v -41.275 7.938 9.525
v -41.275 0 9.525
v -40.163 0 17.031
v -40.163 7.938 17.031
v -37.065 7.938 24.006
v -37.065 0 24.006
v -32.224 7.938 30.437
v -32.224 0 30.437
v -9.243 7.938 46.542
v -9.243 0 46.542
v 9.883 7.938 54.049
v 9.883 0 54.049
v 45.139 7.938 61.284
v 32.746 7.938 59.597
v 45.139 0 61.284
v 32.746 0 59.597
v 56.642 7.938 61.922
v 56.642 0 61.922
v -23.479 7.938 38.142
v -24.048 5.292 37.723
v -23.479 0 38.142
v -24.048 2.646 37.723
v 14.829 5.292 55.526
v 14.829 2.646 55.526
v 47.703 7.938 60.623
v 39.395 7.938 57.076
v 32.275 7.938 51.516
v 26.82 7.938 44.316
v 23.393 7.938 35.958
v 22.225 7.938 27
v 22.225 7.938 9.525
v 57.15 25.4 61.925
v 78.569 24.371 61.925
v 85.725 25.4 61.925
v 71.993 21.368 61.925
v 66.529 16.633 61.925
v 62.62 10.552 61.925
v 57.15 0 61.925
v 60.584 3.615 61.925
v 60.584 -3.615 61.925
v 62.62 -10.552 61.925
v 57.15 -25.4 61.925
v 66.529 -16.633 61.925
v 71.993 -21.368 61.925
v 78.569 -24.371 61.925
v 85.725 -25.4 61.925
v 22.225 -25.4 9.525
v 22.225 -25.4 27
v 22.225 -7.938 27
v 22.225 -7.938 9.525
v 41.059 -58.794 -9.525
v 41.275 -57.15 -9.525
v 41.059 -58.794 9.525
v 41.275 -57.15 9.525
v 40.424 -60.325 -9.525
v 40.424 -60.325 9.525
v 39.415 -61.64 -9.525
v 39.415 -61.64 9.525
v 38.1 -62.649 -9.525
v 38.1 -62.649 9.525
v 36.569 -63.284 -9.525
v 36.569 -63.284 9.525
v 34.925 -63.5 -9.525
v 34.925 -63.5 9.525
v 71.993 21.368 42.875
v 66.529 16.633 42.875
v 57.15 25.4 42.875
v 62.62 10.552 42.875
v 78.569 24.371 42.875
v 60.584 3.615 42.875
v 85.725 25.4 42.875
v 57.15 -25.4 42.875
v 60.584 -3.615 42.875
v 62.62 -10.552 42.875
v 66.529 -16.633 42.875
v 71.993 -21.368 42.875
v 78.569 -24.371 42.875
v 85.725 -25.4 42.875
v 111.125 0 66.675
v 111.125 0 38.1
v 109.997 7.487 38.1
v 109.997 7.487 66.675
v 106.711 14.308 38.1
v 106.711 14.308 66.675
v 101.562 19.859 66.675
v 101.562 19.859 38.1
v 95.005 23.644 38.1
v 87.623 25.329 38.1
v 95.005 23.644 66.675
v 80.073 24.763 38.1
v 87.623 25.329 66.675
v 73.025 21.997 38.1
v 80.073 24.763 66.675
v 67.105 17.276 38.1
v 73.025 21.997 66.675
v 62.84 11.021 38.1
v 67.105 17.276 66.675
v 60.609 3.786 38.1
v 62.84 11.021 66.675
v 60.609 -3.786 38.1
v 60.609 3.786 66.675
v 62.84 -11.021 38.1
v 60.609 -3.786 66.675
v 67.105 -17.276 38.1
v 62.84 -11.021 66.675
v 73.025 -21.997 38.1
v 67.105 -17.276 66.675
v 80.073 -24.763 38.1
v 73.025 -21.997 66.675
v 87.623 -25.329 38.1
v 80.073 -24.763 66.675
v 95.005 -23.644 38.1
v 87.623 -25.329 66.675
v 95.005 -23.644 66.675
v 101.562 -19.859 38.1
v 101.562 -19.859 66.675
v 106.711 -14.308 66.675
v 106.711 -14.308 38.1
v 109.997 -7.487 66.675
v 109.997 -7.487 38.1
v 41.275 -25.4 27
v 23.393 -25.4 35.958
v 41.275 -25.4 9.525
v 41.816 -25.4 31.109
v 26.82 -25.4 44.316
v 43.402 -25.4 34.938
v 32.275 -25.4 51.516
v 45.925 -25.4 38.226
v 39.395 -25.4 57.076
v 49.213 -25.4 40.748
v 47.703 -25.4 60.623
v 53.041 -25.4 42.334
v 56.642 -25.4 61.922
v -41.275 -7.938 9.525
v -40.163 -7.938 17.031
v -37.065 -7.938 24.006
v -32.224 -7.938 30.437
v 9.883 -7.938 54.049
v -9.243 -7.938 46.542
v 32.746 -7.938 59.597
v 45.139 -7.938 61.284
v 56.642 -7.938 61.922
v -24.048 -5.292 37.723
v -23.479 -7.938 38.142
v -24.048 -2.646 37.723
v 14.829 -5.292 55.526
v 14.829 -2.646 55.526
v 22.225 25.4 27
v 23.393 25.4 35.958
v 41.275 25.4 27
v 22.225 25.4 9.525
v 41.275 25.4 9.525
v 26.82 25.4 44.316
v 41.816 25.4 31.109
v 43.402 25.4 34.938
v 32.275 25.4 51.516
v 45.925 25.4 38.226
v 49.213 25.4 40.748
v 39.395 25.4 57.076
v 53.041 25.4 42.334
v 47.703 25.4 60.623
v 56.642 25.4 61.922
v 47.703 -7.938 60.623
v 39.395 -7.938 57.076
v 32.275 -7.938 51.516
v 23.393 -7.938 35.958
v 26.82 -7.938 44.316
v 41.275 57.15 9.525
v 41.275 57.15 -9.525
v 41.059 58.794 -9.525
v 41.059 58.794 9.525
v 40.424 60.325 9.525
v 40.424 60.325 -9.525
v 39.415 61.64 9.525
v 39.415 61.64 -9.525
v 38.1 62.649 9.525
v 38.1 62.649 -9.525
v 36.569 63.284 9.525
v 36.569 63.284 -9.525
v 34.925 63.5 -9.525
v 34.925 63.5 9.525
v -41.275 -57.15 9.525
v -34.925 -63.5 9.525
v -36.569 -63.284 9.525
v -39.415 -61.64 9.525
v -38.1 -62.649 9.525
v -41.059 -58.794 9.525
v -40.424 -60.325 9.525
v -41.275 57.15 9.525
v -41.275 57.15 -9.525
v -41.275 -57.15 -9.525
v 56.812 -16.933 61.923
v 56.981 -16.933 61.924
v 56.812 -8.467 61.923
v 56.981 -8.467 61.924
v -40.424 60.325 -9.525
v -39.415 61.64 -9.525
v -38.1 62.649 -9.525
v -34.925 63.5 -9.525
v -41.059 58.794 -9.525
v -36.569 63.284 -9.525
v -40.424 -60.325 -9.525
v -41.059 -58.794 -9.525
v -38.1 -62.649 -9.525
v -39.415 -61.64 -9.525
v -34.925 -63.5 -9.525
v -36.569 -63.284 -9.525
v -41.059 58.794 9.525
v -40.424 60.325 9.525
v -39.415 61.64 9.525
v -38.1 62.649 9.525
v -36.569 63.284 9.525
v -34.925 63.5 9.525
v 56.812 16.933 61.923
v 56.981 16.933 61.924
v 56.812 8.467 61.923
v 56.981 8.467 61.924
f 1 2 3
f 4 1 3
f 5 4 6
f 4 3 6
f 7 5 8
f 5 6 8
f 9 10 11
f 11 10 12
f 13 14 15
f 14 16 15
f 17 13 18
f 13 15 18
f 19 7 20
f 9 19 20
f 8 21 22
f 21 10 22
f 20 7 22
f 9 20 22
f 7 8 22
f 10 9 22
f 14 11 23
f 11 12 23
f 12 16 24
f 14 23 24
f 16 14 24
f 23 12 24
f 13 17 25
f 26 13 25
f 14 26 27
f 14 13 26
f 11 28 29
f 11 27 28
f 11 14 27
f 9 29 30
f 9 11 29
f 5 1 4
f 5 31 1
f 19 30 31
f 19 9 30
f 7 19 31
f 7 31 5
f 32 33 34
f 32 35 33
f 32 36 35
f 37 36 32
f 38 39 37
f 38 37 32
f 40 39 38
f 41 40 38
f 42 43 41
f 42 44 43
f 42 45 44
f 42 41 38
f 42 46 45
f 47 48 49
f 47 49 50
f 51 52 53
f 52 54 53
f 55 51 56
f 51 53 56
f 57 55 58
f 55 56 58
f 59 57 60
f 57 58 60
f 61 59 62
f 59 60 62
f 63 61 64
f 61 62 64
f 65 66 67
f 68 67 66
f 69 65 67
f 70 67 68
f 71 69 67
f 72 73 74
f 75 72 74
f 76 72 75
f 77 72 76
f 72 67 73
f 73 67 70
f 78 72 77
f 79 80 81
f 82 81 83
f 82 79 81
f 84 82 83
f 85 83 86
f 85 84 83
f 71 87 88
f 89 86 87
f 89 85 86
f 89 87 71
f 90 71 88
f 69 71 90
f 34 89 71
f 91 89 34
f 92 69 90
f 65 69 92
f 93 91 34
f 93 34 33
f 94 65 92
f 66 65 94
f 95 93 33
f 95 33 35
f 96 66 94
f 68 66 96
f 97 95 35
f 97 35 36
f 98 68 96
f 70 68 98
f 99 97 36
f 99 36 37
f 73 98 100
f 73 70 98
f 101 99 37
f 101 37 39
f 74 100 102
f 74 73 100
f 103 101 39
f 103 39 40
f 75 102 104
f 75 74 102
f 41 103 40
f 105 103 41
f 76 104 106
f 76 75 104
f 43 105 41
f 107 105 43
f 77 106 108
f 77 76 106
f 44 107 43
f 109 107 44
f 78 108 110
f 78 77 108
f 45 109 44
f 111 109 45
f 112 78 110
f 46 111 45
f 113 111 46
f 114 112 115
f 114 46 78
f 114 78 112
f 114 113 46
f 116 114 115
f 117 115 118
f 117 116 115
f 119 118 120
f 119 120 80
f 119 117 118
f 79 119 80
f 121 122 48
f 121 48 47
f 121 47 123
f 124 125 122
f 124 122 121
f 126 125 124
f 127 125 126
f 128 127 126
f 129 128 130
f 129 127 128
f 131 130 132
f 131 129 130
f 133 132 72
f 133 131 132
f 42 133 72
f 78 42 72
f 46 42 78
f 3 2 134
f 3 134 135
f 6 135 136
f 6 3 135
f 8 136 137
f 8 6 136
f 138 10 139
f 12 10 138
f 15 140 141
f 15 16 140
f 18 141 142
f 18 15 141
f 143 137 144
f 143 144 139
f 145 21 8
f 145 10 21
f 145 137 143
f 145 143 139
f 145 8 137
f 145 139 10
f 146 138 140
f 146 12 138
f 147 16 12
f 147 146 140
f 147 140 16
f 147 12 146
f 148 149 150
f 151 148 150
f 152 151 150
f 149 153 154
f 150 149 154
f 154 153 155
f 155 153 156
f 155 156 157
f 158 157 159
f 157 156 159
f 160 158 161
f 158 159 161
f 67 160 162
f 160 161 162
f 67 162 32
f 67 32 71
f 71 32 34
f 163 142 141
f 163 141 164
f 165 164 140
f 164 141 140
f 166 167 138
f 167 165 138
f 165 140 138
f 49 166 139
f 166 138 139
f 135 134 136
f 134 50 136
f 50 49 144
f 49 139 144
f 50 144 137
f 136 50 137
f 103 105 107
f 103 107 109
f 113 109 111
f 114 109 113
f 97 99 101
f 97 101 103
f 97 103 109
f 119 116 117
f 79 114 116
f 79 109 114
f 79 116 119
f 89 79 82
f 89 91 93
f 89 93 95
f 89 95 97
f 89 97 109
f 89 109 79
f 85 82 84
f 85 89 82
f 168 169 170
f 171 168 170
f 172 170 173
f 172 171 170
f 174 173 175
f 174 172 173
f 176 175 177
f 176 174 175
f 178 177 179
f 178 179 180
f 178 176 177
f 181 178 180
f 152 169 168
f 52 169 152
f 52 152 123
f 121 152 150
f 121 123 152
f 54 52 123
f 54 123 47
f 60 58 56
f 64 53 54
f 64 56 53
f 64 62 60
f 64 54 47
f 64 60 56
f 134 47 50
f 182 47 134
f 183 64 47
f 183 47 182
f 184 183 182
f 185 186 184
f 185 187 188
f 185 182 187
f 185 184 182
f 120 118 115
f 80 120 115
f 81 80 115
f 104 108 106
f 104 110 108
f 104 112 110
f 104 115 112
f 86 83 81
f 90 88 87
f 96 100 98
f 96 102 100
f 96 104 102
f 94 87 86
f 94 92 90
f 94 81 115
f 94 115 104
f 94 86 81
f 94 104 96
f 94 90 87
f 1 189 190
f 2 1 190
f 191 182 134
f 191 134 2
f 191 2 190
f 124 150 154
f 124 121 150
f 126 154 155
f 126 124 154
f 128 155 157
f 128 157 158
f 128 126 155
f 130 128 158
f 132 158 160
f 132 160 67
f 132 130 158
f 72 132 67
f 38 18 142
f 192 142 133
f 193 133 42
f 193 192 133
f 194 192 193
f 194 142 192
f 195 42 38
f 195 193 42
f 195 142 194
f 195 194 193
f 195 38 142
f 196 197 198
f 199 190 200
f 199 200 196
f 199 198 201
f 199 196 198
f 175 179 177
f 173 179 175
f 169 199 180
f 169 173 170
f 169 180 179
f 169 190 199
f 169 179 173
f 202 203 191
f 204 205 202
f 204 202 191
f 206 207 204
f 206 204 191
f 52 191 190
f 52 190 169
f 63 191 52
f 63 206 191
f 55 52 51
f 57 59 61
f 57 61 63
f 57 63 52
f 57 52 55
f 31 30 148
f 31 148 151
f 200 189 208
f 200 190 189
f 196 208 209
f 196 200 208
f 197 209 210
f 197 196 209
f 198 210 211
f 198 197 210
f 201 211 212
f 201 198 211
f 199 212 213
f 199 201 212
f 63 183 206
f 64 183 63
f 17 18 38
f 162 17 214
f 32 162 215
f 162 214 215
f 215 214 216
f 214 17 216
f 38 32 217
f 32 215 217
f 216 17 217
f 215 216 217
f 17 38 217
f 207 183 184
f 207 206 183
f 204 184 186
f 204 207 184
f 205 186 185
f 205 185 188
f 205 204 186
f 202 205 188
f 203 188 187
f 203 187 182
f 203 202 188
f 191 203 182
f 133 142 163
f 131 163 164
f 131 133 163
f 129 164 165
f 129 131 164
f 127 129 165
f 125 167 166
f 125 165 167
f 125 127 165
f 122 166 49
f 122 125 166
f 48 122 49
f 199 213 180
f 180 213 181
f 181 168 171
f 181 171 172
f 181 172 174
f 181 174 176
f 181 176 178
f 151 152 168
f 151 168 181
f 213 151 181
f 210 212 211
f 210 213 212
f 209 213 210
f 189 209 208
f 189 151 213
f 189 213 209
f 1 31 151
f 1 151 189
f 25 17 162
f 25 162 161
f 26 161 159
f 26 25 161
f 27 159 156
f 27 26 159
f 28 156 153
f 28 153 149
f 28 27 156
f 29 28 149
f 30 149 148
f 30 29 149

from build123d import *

# Parameters (mm, degrees)
F1_DEPTH = 63.5
F0_W     = 25.4
F0_H     = 19.05
F2_DEPTH = 25.4
F3_DEPTH = 7.9375
F5_R     = 6.35


with BuildPart() as f1:
    # F0 (on Front) → F1 (new body, symmetric)
    with BuildSketch(Plane.XZ):
        Polygon((22.225, 9.525), (-41.275, 9.525), (-41.275, -9.525), (41.275, -9.525), (41.275, 9.525), align=None)
    extrude(amount=F1_DEPTH, both=True)

    # F0 (on Front) → F2 (join, symmetric)
    with BuildSketch(Plane.XZ):
        with Locations((73.025, 52.4002)):
            Rectangle(F0_W, F0_H)
        with BuildLine():
            Line((22.225, 27.0002), (22.225, 9.525))
            Line((22.225, 9.525), (41.275, 9.525))
            Line((41.275, 9.525), (41.275, 27.0002))
            ThreePointArc((41.275, 27.0002), (45.9246798487, 38.2255201513), (57.15, 42.8752))
            Line((57.15, 42.8752), (60.325, 42.8752))
            Line((60.325, 42.8752), (60.325, 61.9252))
            Line((60.325, 61.9252), (57.15, 61.9252))
            add(Edge.make_bspline(
                [(56.6424278756, 61.9215114808), (56.8121178687, 61.9231320915), (56.981311275, 61.924361744), (57.15, 61.9252)],
                knots=[110.9960891503, 110.9960891503, 110.9960891503, 110.9960891503, 111.5045361635, 111.5045361635, 111.5045361635, 111.5045361635], degree=3))
            ThreePointArc((56.6424278756, 61.9215114808), (32.275489136, 51.5157936962), (22.225, 27.0002))
        make_face()
    extrude(amount=F2_DEPTH, both=True)

    # F0 (on Front) → F3 (join, symmetric)
    with BuildSketch(Plane.XZ):
        with BuildLine():
            add(Edge.make_bspline(
                [(-41.275, 9.525), (-41.1113175395, 42.5821639465), (19.5983994664, 61.5677254569), (56.6424278756, 61.9215114808)],
                knots=[0, 0, 0, 0, 110.9960891503, 110.9960891503, 110.9960891503, 110.9960891503], degree=3))
            Line((-41.275, 9.525), (22.225, 9.525))
            Line((22.225, 9.525), (22.225, 27.0002))
            ThreePointArc((22.225, 27.0002), (32.275489136, 51.5157936962), (56.6424278756, 61.9215114808))
        make_face()
    extrude(amount=F3_DEPTH, both=True)

    # F0 (on Front) → F4 (revolve)
    with BuildSketch(Plane.XZ):
        Polygon((85.725, 66.675), (85.725, 61.9252), (85.725, 42.8752), (85.725, 38.1), (111.125, 38.1), (111.125, 66.675), align=None)
    revolve(axis=Axis((85.725, 0, 52.3875), (0, 0, 1)))

    # F5
    f5_edges = [f1.edges().sort_by_distance(p)[0] for p in [
        (41.275, -63.5, 0),
        (-41.275, -63.5, 0),
        (41.275, 63.5, 0),
        (-41.275, 63.5, 0),
    ]]
    fillet(f5_edges, radius=F5_R)


solid = f1.part
